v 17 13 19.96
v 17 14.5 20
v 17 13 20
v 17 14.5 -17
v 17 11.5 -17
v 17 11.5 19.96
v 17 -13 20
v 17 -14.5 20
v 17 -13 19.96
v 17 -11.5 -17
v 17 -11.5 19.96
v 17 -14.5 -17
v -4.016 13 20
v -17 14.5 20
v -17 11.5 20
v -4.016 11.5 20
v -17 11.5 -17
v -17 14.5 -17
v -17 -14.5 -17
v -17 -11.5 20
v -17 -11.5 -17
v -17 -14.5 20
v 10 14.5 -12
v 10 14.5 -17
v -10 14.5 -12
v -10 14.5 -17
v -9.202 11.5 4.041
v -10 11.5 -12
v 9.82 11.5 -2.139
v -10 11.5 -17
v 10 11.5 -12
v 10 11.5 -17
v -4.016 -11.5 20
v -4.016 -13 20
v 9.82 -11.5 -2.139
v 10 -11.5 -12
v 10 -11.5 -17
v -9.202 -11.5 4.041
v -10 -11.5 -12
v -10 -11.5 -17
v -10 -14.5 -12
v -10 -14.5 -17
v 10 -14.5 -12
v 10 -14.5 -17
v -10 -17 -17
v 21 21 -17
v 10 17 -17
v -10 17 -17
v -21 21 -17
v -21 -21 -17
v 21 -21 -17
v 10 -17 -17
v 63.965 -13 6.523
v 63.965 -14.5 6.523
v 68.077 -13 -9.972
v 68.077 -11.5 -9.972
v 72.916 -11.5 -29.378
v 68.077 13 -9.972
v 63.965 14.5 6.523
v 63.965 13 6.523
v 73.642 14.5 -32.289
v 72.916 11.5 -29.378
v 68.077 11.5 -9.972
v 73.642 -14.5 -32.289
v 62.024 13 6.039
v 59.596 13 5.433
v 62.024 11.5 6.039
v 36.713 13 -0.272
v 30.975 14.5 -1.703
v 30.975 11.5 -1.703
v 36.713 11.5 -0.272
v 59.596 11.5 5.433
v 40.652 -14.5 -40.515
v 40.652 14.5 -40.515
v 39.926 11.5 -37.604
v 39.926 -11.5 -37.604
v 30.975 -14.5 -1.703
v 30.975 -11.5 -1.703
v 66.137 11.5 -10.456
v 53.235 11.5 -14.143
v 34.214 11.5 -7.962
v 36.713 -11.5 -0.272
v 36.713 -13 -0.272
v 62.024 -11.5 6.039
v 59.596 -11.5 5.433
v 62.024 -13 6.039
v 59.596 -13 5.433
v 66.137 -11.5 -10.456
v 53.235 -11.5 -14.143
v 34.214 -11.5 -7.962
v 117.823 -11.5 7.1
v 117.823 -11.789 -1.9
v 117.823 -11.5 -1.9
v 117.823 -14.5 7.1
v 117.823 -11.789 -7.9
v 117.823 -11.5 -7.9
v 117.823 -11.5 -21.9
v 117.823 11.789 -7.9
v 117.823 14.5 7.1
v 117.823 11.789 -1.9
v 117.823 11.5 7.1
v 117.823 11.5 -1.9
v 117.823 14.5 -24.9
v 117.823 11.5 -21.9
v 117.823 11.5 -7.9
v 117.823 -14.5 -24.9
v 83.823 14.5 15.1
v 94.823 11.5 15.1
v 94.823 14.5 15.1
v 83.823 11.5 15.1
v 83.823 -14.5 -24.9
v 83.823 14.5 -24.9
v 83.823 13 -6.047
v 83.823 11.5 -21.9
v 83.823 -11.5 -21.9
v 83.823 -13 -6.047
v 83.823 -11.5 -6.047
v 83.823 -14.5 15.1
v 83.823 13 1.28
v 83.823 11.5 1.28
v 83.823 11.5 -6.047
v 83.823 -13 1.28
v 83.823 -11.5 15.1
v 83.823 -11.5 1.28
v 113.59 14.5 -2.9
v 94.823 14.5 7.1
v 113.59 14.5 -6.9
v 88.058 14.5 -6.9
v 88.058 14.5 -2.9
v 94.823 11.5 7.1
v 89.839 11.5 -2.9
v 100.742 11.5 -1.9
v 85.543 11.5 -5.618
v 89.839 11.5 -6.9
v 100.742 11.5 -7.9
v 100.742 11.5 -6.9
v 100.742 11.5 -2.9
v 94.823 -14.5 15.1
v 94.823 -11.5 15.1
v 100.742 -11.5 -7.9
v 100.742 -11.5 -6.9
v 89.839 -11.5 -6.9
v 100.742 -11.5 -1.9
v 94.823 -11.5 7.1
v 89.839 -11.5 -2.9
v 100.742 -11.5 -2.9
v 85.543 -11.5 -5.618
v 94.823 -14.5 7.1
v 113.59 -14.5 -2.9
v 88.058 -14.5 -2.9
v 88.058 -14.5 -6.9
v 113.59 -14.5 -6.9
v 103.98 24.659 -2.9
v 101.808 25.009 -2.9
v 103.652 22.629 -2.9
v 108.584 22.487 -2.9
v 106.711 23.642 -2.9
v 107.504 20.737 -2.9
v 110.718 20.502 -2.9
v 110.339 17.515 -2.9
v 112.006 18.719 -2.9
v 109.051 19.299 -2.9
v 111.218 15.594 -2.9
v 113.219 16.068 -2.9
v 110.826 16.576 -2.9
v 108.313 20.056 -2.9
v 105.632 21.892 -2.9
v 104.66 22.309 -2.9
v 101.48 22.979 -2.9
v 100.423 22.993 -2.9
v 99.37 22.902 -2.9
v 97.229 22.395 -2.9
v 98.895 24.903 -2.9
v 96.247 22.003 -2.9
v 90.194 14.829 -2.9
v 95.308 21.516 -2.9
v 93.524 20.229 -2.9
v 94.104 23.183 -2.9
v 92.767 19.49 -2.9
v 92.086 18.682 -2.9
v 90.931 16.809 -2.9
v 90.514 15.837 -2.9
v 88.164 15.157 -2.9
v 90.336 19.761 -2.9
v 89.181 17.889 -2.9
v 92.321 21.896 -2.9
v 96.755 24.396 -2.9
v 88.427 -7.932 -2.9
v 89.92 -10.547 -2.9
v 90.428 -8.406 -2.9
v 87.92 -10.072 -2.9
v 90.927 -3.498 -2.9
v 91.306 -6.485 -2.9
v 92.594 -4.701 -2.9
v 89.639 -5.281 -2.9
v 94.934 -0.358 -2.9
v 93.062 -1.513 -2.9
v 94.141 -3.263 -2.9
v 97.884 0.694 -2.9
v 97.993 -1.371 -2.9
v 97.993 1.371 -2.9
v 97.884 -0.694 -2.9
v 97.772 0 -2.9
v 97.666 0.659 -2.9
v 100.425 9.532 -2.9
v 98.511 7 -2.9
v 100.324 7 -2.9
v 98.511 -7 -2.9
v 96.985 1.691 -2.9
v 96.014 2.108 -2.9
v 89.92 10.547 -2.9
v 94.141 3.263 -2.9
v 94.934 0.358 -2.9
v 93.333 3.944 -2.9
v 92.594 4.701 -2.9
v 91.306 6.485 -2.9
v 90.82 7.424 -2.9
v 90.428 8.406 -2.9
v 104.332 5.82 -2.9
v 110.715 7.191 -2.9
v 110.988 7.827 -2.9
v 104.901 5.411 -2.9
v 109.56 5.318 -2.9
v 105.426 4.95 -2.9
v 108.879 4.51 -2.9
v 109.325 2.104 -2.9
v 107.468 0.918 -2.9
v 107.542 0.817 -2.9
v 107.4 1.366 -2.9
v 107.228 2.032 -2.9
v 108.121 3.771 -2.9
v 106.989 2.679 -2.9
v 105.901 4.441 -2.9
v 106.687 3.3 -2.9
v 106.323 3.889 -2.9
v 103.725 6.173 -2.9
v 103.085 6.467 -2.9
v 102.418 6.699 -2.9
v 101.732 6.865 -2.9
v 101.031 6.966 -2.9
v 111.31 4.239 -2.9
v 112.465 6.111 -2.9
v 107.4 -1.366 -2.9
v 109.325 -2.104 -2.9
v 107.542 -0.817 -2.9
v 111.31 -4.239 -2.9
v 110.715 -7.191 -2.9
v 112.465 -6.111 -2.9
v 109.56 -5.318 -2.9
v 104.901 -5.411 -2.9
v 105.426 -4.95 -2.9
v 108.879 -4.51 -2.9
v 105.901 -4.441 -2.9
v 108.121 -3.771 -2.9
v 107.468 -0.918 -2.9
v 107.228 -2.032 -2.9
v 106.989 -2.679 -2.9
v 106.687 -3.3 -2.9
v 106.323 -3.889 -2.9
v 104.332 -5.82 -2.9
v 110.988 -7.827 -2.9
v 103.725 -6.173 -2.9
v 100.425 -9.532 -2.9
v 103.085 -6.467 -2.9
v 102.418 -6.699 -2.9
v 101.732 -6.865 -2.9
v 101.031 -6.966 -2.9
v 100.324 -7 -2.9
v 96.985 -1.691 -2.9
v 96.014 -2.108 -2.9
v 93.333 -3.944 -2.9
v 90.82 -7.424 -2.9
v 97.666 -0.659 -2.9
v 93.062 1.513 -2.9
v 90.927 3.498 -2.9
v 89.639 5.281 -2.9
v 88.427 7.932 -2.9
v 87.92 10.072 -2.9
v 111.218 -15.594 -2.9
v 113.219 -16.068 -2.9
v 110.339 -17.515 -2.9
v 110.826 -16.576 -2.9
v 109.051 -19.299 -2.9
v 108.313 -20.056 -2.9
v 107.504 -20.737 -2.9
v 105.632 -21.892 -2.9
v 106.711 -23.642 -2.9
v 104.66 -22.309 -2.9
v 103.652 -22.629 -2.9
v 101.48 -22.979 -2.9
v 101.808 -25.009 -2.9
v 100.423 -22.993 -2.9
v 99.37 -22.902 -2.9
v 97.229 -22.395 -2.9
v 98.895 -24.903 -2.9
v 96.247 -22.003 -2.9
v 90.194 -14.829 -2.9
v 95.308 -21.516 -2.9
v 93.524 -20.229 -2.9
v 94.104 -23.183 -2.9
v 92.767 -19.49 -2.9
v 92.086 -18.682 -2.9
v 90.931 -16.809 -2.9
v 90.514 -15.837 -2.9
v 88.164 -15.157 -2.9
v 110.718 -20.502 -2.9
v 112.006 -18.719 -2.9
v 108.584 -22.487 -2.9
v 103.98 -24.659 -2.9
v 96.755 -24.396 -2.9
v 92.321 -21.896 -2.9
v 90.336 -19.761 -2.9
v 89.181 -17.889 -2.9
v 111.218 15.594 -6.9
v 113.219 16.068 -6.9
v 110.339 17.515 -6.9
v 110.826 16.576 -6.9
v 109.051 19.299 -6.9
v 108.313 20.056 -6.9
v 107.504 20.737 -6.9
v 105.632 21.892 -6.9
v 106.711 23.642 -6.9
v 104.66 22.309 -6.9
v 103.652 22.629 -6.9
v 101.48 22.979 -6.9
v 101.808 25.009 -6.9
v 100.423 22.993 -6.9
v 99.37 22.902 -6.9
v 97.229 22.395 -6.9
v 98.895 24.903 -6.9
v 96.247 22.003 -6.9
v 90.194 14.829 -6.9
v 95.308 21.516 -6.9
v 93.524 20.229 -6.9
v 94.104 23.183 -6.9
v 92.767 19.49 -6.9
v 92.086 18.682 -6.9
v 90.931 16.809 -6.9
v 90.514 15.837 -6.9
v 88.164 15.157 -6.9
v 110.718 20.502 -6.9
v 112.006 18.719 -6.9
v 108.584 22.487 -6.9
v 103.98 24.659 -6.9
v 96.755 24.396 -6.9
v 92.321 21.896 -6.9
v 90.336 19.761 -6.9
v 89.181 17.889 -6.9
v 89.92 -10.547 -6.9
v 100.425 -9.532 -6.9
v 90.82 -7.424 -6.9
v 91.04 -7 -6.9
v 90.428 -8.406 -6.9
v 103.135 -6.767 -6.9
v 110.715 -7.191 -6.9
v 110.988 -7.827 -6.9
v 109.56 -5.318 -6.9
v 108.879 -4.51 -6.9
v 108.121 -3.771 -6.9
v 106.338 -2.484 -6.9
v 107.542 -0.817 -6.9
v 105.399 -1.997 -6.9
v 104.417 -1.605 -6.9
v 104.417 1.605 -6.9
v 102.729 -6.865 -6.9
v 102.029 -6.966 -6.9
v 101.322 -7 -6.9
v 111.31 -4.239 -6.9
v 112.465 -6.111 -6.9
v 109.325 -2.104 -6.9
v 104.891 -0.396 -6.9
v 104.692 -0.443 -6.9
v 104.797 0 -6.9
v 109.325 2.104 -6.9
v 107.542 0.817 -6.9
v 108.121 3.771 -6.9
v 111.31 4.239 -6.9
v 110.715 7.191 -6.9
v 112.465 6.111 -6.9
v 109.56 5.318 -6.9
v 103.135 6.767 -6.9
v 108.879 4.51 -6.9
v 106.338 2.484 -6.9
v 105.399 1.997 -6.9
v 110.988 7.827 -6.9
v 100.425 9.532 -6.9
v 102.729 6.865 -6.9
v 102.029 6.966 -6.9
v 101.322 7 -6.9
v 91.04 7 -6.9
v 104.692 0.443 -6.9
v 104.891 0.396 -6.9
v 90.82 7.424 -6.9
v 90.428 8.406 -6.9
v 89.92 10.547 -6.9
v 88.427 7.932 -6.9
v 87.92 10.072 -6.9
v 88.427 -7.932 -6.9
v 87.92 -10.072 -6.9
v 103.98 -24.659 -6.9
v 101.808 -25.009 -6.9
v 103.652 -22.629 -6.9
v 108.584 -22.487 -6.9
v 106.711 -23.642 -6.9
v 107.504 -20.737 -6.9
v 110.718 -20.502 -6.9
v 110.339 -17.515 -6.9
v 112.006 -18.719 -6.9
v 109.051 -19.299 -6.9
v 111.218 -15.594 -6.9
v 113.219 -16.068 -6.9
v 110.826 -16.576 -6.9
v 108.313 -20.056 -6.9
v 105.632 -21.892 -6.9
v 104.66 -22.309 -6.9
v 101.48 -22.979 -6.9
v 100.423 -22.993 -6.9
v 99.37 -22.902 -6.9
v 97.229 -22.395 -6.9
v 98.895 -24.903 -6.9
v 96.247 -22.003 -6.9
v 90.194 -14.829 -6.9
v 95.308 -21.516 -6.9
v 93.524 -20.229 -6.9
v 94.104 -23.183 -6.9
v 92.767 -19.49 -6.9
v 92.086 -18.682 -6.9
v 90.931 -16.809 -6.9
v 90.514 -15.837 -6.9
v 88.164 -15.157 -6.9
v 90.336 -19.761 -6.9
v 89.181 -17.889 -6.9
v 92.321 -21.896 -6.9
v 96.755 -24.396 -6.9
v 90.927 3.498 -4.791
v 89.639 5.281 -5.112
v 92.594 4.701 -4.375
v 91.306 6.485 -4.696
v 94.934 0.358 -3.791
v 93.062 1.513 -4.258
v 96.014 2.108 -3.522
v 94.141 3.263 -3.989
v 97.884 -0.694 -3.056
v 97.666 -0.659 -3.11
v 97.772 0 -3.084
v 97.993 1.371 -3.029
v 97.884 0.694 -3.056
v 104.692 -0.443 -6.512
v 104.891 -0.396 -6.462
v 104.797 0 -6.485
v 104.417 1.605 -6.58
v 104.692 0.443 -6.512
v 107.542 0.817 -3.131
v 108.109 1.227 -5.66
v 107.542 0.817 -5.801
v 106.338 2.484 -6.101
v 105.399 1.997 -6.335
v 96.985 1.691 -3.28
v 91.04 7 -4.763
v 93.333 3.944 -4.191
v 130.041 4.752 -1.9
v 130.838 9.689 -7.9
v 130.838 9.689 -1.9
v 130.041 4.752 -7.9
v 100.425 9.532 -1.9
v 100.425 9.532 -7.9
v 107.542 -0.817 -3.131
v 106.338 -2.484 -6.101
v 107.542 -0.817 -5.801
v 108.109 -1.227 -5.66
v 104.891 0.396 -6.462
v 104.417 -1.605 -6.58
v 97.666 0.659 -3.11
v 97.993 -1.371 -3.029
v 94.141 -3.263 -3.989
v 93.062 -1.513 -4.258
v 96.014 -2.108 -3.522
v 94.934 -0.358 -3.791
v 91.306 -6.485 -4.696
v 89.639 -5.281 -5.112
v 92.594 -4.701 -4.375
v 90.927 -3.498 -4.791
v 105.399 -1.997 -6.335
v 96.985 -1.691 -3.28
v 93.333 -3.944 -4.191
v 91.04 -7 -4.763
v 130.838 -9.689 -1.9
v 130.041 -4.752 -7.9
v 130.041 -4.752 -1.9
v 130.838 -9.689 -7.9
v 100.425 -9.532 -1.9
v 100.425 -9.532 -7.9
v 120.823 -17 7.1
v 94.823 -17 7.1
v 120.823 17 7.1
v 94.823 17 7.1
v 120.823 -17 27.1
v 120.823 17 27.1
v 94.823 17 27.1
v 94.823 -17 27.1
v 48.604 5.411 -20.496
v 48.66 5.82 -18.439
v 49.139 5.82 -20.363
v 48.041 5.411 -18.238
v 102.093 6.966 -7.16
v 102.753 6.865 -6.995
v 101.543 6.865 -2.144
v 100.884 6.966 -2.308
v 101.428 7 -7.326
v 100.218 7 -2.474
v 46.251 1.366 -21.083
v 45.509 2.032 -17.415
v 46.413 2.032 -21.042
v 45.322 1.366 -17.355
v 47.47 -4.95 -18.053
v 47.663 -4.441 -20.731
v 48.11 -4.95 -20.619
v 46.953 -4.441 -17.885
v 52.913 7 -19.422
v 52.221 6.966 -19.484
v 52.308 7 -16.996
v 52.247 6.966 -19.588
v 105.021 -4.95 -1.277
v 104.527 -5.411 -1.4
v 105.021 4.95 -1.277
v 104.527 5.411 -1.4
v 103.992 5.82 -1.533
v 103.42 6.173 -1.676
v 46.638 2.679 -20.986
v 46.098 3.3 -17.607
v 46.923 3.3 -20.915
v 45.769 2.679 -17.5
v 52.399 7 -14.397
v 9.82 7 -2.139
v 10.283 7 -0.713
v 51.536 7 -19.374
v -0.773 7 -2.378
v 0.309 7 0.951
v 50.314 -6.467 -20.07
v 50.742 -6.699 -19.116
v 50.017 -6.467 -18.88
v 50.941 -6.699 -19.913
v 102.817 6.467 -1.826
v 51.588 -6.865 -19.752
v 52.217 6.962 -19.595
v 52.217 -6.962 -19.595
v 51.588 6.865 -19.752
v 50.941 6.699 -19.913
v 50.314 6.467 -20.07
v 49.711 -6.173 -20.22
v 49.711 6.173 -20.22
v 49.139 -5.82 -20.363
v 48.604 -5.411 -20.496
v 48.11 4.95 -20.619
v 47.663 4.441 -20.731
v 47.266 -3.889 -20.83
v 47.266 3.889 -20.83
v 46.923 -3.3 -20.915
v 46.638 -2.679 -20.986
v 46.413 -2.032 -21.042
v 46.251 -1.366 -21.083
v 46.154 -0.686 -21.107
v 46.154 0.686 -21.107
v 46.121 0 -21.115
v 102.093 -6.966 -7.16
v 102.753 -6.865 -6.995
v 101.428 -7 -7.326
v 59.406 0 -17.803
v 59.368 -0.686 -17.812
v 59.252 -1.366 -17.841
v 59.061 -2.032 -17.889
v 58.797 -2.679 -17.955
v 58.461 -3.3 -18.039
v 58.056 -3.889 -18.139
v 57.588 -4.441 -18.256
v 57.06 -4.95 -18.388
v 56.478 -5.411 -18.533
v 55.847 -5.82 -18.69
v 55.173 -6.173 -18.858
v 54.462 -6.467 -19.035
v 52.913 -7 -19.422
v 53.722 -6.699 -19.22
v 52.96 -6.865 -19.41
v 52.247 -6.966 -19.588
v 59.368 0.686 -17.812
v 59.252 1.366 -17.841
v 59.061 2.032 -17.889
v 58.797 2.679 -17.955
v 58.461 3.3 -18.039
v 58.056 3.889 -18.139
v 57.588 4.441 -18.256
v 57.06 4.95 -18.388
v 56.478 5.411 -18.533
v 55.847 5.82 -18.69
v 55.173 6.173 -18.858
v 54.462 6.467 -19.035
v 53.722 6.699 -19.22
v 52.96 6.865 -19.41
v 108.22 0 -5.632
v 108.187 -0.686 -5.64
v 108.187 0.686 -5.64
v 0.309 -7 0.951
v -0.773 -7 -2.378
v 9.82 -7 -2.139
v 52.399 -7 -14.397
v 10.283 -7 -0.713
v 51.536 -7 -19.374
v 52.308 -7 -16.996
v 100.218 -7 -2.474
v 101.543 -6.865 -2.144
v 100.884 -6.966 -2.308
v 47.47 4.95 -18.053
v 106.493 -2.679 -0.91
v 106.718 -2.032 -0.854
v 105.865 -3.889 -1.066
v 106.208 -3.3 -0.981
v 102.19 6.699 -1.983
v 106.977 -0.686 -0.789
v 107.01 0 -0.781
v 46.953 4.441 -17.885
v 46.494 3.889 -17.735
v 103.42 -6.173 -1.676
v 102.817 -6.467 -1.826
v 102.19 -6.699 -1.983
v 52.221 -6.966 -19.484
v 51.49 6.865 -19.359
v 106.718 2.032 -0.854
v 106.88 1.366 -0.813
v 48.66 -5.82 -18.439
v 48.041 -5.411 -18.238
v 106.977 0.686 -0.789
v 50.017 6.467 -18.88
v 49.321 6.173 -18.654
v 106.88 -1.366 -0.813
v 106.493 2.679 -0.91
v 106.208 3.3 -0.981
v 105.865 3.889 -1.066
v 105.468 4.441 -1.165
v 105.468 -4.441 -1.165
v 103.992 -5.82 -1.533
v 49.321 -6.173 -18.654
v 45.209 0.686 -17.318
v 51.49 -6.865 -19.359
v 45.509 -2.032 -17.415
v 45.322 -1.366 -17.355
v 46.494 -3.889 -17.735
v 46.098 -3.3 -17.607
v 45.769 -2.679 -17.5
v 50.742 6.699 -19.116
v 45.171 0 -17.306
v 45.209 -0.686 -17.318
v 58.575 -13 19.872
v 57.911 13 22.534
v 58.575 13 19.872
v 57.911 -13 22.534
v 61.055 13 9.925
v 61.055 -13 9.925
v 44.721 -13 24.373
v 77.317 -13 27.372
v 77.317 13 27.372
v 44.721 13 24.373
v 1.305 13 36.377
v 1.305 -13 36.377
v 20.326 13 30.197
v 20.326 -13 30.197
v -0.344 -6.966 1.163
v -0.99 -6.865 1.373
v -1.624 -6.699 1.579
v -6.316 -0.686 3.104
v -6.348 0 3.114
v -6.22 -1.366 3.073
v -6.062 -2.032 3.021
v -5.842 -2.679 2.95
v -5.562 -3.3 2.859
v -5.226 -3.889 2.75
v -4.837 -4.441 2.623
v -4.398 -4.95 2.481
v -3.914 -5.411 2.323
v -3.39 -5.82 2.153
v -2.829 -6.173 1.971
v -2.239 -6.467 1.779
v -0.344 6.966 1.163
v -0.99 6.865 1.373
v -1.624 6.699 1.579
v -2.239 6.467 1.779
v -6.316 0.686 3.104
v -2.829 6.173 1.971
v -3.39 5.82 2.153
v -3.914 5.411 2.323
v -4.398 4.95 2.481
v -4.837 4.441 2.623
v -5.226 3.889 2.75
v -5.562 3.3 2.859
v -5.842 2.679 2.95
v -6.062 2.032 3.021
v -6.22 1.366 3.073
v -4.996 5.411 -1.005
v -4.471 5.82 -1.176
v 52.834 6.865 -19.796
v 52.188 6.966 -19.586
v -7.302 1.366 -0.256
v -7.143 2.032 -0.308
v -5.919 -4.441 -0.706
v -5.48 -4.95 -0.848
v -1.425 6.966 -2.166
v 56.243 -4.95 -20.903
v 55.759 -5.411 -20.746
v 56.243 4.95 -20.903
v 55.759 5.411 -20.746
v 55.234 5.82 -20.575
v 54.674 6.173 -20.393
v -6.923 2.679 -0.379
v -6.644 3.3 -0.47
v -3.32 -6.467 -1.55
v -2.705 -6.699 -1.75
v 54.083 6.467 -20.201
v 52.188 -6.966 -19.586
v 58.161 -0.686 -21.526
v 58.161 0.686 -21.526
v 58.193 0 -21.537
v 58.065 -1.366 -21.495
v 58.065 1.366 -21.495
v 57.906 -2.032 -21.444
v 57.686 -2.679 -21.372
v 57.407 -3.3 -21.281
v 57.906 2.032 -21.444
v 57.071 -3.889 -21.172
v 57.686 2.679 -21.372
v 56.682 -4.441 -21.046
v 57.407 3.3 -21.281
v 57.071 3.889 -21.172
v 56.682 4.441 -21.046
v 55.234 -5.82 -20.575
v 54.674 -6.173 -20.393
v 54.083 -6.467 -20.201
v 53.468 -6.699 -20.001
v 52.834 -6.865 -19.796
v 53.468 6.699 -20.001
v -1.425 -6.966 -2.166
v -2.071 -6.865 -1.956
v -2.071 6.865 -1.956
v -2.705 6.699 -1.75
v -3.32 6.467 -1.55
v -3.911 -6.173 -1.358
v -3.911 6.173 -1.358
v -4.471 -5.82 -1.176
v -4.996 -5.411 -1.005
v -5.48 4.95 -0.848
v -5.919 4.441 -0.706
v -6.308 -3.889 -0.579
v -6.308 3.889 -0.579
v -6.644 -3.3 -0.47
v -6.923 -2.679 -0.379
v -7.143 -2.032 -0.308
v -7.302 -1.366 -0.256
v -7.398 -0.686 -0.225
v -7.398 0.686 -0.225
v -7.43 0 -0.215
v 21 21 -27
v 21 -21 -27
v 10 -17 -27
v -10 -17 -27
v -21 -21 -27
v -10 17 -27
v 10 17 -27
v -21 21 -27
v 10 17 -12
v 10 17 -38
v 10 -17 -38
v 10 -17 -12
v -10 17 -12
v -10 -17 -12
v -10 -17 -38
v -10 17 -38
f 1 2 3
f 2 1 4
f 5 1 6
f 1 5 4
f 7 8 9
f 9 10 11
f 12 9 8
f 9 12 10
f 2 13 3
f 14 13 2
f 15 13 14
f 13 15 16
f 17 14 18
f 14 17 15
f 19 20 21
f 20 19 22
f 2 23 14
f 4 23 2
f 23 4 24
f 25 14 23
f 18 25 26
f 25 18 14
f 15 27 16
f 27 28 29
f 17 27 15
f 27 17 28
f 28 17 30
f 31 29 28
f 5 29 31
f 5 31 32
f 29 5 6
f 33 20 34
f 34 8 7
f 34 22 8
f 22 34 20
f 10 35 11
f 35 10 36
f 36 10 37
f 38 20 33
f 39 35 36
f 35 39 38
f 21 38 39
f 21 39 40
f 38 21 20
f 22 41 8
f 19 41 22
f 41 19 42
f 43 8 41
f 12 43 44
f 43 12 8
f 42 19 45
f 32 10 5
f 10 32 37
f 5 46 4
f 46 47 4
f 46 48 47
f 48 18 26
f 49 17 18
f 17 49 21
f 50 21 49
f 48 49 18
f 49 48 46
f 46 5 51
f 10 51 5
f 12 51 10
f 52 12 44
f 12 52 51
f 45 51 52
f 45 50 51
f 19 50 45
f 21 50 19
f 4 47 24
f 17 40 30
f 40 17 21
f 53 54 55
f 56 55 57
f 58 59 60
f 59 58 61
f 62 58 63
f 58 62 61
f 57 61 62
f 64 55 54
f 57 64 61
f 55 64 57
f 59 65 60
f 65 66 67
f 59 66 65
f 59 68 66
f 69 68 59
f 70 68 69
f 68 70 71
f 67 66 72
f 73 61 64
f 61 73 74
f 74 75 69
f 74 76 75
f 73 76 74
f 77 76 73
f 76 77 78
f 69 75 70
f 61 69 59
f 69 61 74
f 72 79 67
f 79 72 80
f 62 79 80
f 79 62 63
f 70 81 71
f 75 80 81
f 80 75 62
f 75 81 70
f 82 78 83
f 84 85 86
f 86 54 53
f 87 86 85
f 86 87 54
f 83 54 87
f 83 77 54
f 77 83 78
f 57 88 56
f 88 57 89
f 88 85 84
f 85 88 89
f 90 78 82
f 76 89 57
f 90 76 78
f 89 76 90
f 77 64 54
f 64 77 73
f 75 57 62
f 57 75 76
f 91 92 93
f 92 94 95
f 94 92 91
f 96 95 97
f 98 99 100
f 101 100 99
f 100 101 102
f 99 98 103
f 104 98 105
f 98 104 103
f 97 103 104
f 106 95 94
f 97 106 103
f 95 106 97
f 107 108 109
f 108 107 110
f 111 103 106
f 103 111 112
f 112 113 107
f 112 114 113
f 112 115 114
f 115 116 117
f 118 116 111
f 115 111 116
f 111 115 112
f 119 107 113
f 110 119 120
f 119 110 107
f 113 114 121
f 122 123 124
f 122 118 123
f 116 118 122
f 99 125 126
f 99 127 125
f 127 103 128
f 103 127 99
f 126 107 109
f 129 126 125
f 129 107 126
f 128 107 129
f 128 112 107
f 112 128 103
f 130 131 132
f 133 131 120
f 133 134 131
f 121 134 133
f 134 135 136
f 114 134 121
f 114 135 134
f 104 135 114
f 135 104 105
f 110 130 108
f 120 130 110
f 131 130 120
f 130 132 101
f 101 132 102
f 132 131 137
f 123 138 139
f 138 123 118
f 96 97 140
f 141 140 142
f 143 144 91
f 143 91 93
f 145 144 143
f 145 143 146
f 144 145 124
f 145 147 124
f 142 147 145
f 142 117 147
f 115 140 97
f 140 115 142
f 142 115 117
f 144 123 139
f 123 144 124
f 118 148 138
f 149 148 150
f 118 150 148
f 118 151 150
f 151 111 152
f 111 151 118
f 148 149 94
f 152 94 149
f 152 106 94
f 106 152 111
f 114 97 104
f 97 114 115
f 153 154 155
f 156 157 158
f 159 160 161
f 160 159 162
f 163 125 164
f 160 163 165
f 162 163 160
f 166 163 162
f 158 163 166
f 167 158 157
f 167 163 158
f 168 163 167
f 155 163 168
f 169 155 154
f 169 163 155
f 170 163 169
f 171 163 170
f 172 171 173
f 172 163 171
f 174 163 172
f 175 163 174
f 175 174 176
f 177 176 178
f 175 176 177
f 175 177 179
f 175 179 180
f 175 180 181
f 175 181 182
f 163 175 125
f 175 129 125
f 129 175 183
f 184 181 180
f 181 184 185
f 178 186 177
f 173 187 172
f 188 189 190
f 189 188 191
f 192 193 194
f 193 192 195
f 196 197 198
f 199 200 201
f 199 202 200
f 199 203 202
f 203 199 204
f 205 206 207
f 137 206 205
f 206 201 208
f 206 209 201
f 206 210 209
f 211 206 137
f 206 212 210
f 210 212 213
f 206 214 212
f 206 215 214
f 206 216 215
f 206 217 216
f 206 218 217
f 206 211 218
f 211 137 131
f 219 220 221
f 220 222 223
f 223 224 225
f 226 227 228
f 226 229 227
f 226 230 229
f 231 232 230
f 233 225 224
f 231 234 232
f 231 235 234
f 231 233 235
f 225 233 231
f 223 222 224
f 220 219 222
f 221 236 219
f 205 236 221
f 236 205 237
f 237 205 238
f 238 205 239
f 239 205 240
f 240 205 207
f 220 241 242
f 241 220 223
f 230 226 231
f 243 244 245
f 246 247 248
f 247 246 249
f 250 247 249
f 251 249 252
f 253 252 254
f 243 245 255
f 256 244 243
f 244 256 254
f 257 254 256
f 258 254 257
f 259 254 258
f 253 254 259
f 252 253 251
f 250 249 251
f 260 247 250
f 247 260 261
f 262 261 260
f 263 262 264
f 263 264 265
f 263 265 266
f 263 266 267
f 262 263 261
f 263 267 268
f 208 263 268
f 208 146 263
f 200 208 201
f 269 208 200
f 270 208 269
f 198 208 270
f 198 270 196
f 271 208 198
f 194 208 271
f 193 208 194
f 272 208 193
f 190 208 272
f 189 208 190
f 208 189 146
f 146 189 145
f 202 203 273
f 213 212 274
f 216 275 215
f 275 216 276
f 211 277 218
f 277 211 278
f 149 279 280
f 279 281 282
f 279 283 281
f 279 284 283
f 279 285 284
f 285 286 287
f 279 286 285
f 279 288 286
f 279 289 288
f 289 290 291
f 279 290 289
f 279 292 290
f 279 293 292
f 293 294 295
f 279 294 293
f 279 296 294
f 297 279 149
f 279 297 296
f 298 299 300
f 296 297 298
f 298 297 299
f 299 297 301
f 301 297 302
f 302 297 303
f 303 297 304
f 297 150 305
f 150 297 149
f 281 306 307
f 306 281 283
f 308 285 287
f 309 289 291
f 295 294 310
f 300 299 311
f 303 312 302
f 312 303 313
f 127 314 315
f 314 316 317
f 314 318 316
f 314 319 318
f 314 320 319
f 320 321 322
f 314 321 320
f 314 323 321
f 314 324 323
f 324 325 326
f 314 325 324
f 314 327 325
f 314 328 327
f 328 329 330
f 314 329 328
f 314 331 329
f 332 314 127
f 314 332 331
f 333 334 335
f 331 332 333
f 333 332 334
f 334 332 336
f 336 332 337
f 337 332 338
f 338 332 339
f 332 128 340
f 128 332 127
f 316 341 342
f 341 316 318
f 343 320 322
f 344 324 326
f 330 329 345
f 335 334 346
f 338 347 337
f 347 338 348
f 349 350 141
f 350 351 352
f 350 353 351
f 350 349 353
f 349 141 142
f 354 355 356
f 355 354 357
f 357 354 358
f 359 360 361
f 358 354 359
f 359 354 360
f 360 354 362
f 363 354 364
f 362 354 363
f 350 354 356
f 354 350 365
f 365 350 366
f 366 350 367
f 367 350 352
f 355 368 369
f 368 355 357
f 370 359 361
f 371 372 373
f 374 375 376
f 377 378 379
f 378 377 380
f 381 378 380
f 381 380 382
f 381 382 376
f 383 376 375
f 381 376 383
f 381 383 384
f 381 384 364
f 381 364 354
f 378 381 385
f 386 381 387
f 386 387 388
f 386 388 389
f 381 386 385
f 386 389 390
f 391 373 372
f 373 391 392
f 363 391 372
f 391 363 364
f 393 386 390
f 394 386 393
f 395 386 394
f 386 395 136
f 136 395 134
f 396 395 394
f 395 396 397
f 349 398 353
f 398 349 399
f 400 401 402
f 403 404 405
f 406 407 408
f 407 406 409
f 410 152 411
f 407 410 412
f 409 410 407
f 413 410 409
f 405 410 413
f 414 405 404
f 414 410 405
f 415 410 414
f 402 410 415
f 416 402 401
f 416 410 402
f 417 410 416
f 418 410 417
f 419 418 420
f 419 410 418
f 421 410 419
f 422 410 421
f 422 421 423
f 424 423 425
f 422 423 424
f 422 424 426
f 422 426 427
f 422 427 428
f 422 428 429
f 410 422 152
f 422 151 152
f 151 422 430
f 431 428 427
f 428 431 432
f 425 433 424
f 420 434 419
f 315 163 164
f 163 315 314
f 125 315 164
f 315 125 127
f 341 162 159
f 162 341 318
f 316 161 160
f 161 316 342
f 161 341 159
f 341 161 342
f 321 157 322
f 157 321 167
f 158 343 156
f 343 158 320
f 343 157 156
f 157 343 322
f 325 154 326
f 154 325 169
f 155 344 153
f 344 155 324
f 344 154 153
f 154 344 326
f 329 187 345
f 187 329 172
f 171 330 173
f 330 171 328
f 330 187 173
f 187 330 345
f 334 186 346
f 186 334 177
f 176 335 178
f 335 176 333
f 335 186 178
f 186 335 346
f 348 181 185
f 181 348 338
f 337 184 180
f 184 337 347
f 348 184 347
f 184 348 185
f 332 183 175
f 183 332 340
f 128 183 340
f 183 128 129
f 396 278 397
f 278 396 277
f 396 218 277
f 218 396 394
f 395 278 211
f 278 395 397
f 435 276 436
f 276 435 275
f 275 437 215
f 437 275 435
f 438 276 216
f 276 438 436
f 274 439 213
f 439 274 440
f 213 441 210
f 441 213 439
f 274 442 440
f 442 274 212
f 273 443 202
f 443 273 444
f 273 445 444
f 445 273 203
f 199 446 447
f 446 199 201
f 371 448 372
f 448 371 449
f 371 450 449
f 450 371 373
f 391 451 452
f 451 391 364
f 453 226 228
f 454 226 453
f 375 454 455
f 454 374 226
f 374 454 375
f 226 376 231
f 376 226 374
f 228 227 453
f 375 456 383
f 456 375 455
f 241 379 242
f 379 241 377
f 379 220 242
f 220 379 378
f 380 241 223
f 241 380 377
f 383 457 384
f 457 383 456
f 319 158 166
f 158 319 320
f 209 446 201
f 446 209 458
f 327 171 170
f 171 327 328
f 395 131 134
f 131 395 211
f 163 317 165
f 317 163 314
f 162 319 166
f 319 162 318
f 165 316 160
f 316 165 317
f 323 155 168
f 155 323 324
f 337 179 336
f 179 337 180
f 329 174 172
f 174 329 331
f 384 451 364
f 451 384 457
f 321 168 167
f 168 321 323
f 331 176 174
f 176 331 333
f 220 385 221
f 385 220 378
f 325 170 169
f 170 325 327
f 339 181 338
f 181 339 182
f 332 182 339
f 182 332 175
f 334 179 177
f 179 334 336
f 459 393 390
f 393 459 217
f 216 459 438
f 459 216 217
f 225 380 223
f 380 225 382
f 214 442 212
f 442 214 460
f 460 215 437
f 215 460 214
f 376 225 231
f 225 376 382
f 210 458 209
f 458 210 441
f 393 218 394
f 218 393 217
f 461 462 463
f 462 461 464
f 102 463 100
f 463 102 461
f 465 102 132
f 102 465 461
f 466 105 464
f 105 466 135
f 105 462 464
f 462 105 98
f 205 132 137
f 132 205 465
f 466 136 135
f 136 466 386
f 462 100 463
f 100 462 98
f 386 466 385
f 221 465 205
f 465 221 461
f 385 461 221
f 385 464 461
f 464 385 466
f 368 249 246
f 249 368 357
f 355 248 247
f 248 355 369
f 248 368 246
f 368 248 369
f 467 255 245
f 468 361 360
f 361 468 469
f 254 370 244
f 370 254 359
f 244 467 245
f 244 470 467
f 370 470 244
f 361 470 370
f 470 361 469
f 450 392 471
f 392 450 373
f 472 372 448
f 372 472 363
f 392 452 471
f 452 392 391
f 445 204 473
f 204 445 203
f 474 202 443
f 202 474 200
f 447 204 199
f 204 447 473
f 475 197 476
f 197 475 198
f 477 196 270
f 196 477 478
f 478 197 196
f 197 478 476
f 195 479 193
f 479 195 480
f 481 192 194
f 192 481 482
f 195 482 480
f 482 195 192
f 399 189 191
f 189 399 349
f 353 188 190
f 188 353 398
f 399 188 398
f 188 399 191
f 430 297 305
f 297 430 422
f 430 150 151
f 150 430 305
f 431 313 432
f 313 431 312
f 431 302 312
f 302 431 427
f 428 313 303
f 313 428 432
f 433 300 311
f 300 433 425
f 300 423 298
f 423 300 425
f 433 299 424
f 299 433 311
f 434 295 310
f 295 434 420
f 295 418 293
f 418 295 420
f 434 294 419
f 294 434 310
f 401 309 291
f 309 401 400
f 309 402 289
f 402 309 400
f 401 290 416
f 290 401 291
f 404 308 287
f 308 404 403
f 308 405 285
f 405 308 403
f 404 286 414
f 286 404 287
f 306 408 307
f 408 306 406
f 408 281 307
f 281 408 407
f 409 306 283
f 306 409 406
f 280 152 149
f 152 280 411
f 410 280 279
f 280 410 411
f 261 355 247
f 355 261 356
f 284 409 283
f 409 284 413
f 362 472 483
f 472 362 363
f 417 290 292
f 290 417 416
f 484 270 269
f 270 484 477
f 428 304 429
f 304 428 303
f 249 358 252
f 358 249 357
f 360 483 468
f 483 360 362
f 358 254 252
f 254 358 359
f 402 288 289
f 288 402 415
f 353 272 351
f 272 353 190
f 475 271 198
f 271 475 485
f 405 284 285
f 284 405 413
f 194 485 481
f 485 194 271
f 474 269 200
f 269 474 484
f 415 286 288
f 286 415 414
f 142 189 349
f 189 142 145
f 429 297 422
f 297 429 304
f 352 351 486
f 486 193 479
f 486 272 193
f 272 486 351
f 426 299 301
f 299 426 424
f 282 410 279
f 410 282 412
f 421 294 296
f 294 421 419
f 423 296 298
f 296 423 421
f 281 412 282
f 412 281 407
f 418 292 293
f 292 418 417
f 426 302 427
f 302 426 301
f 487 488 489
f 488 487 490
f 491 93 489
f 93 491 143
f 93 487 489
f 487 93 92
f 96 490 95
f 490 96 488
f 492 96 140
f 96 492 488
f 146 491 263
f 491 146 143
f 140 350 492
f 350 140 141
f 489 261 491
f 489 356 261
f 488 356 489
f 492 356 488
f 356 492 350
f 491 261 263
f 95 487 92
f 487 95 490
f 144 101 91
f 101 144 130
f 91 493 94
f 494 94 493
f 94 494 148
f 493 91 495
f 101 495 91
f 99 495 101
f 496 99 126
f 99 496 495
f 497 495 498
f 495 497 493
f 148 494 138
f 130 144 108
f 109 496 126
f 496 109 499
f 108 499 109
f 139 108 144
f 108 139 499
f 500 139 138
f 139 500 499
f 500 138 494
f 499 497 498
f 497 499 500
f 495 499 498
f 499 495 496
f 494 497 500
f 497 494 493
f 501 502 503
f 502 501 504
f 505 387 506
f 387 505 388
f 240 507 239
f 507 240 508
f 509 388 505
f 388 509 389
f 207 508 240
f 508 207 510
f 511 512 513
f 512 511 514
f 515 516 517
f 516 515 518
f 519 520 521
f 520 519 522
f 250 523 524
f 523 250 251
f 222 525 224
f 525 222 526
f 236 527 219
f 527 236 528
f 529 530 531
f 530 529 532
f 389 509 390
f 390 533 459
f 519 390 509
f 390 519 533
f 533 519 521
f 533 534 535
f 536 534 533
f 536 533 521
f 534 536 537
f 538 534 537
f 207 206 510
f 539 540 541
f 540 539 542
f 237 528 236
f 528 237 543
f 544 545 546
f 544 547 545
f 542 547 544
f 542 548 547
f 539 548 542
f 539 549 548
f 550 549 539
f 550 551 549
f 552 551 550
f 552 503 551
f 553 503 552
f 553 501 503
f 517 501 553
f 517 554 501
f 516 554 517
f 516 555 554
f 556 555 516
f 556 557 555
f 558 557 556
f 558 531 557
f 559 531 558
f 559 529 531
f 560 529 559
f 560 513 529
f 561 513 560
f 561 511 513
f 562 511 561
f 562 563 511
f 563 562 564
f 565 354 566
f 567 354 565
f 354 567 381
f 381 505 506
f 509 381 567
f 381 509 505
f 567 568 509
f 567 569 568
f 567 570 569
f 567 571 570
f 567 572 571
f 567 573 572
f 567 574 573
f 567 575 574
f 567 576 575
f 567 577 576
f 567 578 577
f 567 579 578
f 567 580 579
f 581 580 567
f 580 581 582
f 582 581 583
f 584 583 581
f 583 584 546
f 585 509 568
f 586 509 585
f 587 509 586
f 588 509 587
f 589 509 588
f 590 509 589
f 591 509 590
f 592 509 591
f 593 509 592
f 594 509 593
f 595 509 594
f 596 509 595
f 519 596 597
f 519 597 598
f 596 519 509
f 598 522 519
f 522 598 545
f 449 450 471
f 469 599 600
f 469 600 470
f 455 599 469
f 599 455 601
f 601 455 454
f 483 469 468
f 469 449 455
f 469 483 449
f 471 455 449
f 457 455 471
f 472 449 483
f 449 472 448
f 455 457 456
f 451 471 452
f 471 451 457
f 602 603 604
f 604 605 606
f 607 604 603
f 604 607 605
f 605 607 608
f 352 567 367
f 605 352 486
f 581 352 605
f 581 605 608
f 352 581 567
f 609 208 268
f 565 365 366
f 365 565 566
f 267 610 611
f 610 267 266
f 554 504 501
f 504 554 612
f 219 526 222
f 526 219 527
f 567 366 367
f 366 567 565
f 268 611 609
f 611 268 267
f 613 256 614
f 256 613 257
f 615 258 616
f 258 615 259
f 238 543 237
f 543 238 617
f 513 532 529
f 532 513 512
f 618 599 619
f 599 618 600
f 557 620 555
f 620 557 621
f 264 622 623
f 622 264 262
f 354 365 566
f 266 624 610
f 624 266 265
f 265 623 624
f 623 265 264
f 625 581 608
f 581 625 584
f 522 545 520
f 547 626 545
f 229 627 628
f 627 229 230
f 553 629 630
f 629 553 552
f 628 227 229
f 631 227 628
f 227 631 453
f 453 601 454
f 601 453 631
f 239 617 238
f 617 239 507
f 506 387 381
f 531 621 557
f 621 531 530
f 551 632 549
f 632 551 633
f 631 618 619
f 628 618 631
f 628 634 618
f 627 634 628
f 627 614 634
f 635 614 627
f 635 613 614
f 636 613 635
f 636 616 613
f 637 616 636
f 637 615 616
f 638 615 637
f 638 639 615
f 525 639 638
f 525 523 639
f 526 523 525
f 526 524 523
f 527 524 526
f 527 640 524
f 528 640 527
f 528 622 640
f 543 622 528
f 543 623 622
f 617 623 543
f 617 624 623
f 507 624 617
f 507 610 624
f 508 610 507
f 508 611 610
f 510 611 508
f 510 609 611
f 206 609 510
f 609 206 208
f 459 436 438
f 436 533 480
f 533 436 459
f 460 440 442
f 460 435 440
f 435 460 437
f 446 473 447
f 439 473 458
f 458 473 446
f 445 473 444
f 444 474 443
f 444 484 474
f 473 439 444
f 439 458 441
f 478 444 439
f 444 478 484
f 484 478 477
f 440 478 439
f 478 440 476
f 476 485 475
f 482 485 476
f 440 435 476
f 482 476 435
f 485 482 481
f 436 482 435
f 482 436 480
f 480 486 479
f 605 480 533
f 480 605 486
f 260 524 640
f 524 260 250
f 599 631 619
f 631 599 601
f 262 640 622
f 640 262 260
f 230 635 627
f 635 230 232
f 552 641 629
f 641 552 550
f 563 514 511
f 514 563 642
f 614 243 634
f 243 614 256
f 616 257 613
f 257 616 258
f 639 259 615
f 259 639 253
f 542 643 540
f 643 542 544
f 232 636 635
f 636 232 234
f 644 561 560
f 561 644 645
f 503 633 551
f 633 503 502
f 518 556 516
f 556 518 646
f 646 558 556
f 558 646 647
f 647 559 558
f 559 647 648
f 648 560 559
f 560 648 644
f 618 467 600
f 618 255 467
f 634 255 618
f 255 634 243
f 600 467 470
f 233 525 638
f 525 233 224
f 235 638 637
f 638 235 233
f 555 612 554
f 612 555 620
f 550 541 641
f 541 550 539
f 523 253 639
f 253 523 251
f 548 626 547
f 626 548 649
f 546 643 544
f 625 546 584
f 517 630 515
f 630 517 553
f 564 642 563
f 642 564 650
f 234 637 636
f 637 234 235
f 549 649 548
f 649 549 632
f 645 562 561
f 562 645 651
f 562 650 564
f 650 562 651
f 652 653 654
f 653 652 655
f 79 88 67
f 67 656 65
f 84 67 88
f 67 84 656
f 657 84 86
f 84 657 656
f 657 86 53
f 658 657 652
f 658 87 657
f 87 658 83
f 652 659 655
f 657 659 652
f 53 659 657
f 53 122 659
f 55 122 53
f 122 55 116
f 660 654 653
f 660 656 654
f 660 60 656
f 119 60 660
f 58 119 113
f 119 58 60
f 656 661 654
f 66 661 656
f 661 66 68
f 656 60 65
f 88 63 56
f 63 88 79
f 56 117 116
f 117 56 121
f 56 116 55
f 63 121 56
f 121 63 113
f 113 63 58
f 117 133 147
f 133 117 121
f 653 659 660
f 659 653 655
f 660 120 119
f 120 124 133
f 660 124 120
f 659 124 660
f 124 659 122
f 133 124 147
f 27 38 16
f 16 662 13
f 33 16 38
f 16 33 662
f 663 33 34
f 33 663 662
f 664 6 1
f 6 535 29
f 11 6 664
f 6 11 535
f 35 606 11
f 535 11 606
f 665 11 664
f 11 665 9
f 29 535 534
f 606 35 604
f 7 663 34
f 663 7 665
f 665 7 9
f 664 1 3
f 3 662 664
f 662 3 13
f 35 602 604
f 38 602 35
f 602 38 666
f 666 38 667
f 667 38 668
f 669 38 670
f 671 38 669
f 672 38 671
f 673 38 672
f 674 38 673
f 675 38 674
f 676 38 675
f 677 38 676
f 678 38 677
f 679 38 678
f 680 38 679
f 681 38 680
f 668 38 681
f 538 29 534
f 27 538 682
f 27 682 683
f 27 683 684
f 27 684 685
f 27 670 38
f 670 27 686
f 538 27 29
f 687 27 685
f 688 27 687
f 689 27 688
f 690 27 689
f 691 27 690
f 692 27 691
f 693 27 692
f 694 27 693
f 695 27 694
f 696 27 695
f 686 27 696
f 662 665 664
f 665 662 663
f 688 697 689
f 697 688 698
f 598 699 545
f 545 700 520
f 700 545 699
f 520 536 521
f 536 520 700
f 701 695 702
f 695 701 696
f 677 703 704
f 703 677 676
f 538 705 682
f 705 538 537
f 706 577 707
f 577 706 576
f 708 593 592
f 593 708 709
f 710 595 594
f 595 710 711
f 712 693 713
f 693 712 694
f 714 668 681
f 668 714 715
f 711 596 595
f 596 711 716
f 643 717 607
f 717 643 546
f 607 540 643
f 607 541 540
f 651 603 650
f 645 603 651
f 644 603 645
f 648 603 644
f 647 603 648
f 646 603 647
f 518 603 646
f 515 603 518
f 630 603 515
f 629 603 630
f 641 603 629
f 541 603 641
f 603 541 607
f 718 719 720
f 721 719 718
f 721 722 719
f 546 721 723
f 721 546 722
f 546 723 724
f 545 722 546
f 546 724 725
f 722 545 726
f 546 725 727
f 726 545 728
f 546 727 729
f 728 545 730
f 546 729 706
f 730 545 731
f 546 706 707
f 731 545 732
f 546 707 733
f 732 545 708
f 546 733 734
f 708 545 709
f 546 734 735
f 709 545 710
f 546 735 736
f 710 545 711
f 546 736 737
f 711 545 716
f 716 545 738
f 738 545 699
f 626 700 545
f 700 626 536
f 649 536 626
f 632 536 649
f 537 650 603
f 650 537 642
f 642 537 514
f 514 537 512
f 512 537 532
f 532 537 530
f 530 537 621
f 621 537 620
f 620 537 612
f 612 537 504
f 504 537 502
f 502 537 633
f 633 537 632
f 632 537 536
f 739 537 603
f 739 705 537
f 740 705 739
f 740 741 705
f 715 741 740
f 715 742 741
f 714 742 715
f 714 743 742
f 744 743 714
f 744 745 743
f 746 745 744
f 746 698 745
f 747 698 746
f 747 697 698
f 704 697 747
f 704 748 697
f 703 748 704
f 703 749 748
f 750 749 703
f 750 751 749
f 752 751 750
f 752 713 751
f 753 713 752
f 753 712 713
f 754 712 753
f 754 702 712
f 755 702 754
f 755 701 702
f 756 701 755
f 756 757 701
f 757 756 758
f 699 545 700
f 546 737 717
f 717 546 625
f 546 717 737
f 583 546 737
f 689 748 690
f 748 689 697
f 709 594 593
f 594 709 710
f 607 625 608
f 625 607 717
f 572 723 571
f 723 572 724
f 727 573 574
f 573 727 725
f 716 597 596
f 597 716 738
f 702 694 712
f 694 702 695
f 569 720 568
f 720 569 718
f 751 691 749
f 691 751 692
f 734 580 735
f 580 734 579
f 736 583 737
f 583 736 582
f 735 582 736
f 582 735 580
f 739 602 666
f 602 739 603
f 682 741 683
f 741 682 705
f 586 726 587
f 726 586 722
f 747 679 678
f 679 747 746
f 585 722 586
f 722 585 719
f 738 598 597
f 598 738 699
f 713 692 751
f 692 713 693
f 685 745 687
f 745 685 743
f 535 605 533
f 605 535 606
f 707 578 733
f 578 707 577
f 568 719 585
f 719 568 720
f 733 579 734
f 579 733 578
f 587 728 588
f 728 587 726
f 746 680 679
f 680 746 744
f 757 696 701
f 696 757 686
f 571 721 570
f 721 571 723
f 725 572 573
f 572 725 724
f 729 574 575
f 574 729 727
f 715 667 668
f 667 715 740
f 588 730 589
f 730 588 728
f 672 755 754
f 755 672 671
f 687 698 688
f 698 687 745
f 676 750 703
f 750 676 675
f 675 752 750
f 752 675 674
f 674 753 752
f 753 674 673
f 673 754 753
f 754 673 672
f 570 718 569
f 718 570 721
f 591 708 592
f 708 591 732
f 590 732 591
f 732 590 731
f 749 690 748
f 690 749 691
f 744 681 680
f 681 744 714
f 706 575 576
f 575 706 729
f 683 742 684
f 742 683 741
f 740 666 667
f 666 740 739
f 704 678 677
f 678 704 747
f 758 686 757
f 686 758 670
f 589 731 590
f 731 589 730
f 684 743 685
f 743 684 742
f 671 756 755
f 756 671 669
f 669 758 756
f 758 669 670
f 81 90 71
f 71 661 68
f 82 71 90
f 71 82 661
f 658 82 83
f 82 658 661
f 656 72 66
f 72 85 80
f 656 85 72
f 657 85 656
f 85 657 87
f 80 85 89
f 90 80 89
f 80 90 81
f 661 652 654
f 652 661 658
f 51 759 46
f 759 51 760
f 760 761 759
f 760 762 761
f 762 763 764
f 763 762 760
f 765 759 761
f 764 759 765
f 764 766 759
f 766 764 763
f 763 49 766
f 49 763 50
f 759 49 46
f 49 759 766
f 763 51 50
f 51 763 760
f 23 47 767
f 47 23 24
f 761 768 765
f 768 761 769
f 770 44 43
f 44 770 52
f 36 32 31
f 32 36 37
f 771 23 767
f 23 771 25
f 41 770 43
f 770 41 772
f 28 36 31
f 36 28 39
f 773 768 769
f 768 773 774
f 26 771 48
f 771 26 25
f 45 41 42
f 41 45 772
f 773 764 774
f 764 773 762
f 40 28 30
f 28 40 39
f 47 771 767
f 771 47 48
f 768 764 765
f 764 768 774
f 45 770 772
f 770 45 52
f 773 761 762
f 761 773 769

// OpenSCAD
// file: design_parameters.scad
/*
Generated from hardware/microduck-arm-v1/spec/design.json.
Canonical spec SHA-256: 57aed79ec22c5e651950271e089a578766dc49e7a30961353c9d3a308688a50d.
ENGINEERING PROTOTYPE NOT FABRICATION RELEASE
Do not hand-edit; regenerate with cad/generate_engineering.py.
*/
design_revision = "engineering-prototype-1";
motor_model = "XL330-M288-T";
motor_count = 5;
motor_mass_g = 18;
motor_envelope_mm = [20, 34, 26];
servo_center_yaw_local_mm = [0, 0, -25];
servo_center_shoulder_local_mm = [0, 0, 18];
servo_center_elbow_local_mm = [45, 0, 20];
servo_center_wrist_local_mm = [25, 0, 20];
servo_center_gripper_local_mm = [7, 0, 22];
shoulder_elbow_mm = 55;
elbow_wrist_mm = 50;
wrist_tcp_mm = 30;
jaw_center_offset_mm = 12;
jaw_length_mm = 30;
jaw_coupling_ratio = -1;
gripper_max_closure_rad = 0.32;
gripper_left_range_rad = [-0.32, 0];
gripper_right_range_rad = [0, 0.32];
trunk_mount_target_g = 20;
arm_cartridge_target_g = 160;
// main file
/*
MicroDuck single arm v1-B editable parametric engineering concept.

ENGINEERING PROTOTYPE NOT FABRICATION RELEASE

This model contains:
- five motor clearance envelopes, not mounting interfaces;
- four pose axes: base yaw, shoulder, elbow, wrist;
- one rotary gripper actuator;
- equal counter-rotating jaw gears with ratio -1;
- solid support and link blanks labelled for later mating machining.

This model intentionally contains no servo holes, horn bolt circle, pilot,
bearing seat, fastener depth, cable gland, tolerance, or released gear tooth
geometry. The source mesh is about 29 mm deep while the manufacturer body
envelope is 26 mm deep; neither is authority for a mating interface.
Canonical servo centers are visual placement inputs only. Overall packaging,
self-interference, cable routing, and table clearance remain unverified.
*/

$fn = 64;

include <design_parameters.scad>

render_part = "assembly"; // assembly, gripper, support_blanks, motor_envelope
pose_deg = [0, 18, -32, 14]; // base, shoulder, elbow, wrist review pose
gripper_left_q_rad = -0.16;

link_width_mm = 14;
link_thickness_mm = 5;
support_wall_mm = 3;
support_clearance_mm = 1.5; // visualization only; not a manufacturing fit
gear_pitch_radius_mm = jaw_center_offset_mm;
gear_visual_teeth = 16; // visual coupling only; module and profile TBD

module engineering_notice(label) {
    // Console labels remain visible when reviewing individual modules.
    echo(str("ENGINEERING PROTOTYPE NOT FABRICATION RELEASE: ", label));
}

module motor_envelope(label = "MOTOR") {
    engineering_notice(str(label, " clearance envelope only"));
    color([0.70, 0.74, 0.78, 0.70])
        cube(motor_envelope_mm, center = true);
}

module motor_at(center_mm, label = "MOTOR", orientation_deg = [0, 0, 0]) {
    translate(center_mm)
        rotate(orientation_deg)
            motor_envelope(label);
}

module link_blank(axis_distance_mm, label = "LINK BLANK") {
    engineering_notice(str(label, " - TBD mating machining"));
    color([0.88, 0.48, 0.12])
        hull() {
            cylinder(h = link_thickness_mm, d = link_width_mm, center = true);
            translate([axis_distance_mm, 0, 0])
                cylinder(h = link_thickness_mm, d = link_width_mm, center = true);
        }
}

module dual_side_support_blank(label = "SUPPORT BLANK") {
    engineering_notice(str(label, " - solid, no holes"));
    inner_y = motor_envelope_mm[0] / 2 + support_clearance_mm;
    height = motor_envelope_mm[1] + 2 * support_wall_mm;
    color([0.96, 0.78, 0.25], 0.80) {
        translate([0, inner_y + support_wall_mm / 2, 0])
            cube([motor_envelope_mm[2] + 8, support_wall_mm, height], center = true);
        translate([0, -inner_y - support_wall_mm / 2, 0])
            cube([motor_envelope_mm[2] + 8, support_wall_mm, height], center = true);
        translate([0, 0, -height / 2 + support_wall_mm / 2])
            cube(
                [
                    motor_envelope_mm[2] + 8,
                    2 * (inner_y + support_wall_mm),
                    support_wall_mm
                ],
                center = true
            );
    }
}

module visual_equal_gear(label = "GEAR") {
    engineering_notice(str(label, " visual pitch geometry; teeth TBD"));
    color([0.35, 0.55, 0.72]) {
        cylinder(h = 4, r = gear_pitch_radius_mm - 1, center = true);
        for (tooth = [0 : gear_visual_teeth - 1])
            rotate([0, 0, tooth * 360 / gear_visual_teeth])
                translate([gear_pitch_radius_mm - 0.5, 0, 0])
                    cube([3, 2.2, 4], center = true);
    }
}

module jaw_blank(label = "JAW BLANK") {
    engineering_notice(str(label, " - rotary, fingertip and retention TBD"));
    color([0.20, 0.68, 0.46])
        translate([jaw_length_mm / 2, 0, 0])
            cube([jaw_length_mm, 5, 6], center = true);
}

module geared_gripper(left_q_rad = gripper_left_q_rad) {
    engineering_notice("equal gears ratio -1; axes y +/-12 mm, parallel +Z");
    assert(
        jaw_coupling_ratio == -1,
        "canonical gripper coupling must remain right = -left"
    );
    assert(
        left_q_rad >= gripper_left_range_rad[0]
        && left_q_rad <= gripper_left_range_rad[1],
        "left gripper q outside canonical [-0.32, 0] rad range"
    );
    right_q_rad = -left_q_rad;
    assert(
        right_q_rad >= gripper_right_range_rad[0]
        && right_q_rad <= gripper_right_range_rad[1],
        "right gripper q outside canonical [0, 0.32] rad range"
    );
    // Looking down +Z: left hinge is at +Y and has q in [-0.32, 0].
    // Right hinge is at -Y, q_right = -q_left in [0, 0.32].
    translate([0, jaw_center_offset_mm, 0])
        rotate([0, 0, left_q_rad * 180 / PI]) {
            visual_equal_gear("DRIVEN GEAR A");
            jaw_blank("JAW A");
        }
    translate([0, -jaw_center_offset_mm, 0])
        rotate([0, 0, right_q_rad * 180 / PI]) {
            visual_equal_gear("FOLLOWER GEAR B");
            jaw_blank("JAW B");
        }
    motor_at(
        servo_center_gripper_local_mm,
        "M5 ROTARY GRIPPER - ABOVE HAND",
        [0, 90, 0]
    );
}

module arm_cartridge() {
    engineering_notice(str("arm cartridge target ", arm_cartridge_target_g, " g - unverified"));
    engineering_notice("overall packaging and table clearance unverified");

    // M1 base yaw envelope and 20 g target trunk blank.
    color([0.95, 0.78, 0.25], 0.85)
        translate([0, 0, -22])
            cube([42, 42, 10], center = true);
    motor_at(servo_center_yaw_local_mm, "M1 BASE YAW");

    rotate([0, 0, pose_deg[0]])
        translate([0, 0, 0]) {
            dual_side_support_blank("SHOULDER SUPPORT BLANK");
            rotate([0, pose_deg[1], 0]) {
                motor_at(
                    servo_center_shoulder_local_mm,
                    "M2 SHOULDER",
                    [90, 0, 0]
                );
                link_blank(shoulder_elbow_mm, "UPPER LINK BLANK");
                motor_at(
                    servo_center_elbow_local_mm,
                    "M3 ELBOW IN UPPER-ARM FRAME",
                    [90, 0, 0]
                );

                translate([shoulder_elbow_mm, 0, 0])
                    rotate([0, pose_deg[2], 0]) {
                        dual_side_support_blank("ELBOW SUPPORT BLANK");
                        link_blank(elbow_wrist_mm, "FOREARM LINK BLANK");
                        motor_at(
                            servo_center_wrist_local_mm,
                            "M4 WRIST IN FOREARM FRAME",
                            [90, 0, 0]
                        );

                        translate([elbow_wrist_mm, 0, 0])
                            rotate([0, pose_deg[3], 0]) {
                                dual_side_support_blank("WRIST SUPPORT BLANK");
                                geared_gripper();
                            }
                    }
            }
        }
}

if (render_part == "assembly") {
    arm_cartridge();
} else if (render_part == "gripper") {
    geared_gripper();
} else if (render_part == "support_blanks") {
    dual_side_support_blank();
    translate([45, 0, 0])
        link_blank(shoulder_elbow_mm);
    translate([45, 24, 0])
        link_blank(elbow_wrist_mm);
} else if (render_part == "motor_envelope") {
    motor_envelope();
}
